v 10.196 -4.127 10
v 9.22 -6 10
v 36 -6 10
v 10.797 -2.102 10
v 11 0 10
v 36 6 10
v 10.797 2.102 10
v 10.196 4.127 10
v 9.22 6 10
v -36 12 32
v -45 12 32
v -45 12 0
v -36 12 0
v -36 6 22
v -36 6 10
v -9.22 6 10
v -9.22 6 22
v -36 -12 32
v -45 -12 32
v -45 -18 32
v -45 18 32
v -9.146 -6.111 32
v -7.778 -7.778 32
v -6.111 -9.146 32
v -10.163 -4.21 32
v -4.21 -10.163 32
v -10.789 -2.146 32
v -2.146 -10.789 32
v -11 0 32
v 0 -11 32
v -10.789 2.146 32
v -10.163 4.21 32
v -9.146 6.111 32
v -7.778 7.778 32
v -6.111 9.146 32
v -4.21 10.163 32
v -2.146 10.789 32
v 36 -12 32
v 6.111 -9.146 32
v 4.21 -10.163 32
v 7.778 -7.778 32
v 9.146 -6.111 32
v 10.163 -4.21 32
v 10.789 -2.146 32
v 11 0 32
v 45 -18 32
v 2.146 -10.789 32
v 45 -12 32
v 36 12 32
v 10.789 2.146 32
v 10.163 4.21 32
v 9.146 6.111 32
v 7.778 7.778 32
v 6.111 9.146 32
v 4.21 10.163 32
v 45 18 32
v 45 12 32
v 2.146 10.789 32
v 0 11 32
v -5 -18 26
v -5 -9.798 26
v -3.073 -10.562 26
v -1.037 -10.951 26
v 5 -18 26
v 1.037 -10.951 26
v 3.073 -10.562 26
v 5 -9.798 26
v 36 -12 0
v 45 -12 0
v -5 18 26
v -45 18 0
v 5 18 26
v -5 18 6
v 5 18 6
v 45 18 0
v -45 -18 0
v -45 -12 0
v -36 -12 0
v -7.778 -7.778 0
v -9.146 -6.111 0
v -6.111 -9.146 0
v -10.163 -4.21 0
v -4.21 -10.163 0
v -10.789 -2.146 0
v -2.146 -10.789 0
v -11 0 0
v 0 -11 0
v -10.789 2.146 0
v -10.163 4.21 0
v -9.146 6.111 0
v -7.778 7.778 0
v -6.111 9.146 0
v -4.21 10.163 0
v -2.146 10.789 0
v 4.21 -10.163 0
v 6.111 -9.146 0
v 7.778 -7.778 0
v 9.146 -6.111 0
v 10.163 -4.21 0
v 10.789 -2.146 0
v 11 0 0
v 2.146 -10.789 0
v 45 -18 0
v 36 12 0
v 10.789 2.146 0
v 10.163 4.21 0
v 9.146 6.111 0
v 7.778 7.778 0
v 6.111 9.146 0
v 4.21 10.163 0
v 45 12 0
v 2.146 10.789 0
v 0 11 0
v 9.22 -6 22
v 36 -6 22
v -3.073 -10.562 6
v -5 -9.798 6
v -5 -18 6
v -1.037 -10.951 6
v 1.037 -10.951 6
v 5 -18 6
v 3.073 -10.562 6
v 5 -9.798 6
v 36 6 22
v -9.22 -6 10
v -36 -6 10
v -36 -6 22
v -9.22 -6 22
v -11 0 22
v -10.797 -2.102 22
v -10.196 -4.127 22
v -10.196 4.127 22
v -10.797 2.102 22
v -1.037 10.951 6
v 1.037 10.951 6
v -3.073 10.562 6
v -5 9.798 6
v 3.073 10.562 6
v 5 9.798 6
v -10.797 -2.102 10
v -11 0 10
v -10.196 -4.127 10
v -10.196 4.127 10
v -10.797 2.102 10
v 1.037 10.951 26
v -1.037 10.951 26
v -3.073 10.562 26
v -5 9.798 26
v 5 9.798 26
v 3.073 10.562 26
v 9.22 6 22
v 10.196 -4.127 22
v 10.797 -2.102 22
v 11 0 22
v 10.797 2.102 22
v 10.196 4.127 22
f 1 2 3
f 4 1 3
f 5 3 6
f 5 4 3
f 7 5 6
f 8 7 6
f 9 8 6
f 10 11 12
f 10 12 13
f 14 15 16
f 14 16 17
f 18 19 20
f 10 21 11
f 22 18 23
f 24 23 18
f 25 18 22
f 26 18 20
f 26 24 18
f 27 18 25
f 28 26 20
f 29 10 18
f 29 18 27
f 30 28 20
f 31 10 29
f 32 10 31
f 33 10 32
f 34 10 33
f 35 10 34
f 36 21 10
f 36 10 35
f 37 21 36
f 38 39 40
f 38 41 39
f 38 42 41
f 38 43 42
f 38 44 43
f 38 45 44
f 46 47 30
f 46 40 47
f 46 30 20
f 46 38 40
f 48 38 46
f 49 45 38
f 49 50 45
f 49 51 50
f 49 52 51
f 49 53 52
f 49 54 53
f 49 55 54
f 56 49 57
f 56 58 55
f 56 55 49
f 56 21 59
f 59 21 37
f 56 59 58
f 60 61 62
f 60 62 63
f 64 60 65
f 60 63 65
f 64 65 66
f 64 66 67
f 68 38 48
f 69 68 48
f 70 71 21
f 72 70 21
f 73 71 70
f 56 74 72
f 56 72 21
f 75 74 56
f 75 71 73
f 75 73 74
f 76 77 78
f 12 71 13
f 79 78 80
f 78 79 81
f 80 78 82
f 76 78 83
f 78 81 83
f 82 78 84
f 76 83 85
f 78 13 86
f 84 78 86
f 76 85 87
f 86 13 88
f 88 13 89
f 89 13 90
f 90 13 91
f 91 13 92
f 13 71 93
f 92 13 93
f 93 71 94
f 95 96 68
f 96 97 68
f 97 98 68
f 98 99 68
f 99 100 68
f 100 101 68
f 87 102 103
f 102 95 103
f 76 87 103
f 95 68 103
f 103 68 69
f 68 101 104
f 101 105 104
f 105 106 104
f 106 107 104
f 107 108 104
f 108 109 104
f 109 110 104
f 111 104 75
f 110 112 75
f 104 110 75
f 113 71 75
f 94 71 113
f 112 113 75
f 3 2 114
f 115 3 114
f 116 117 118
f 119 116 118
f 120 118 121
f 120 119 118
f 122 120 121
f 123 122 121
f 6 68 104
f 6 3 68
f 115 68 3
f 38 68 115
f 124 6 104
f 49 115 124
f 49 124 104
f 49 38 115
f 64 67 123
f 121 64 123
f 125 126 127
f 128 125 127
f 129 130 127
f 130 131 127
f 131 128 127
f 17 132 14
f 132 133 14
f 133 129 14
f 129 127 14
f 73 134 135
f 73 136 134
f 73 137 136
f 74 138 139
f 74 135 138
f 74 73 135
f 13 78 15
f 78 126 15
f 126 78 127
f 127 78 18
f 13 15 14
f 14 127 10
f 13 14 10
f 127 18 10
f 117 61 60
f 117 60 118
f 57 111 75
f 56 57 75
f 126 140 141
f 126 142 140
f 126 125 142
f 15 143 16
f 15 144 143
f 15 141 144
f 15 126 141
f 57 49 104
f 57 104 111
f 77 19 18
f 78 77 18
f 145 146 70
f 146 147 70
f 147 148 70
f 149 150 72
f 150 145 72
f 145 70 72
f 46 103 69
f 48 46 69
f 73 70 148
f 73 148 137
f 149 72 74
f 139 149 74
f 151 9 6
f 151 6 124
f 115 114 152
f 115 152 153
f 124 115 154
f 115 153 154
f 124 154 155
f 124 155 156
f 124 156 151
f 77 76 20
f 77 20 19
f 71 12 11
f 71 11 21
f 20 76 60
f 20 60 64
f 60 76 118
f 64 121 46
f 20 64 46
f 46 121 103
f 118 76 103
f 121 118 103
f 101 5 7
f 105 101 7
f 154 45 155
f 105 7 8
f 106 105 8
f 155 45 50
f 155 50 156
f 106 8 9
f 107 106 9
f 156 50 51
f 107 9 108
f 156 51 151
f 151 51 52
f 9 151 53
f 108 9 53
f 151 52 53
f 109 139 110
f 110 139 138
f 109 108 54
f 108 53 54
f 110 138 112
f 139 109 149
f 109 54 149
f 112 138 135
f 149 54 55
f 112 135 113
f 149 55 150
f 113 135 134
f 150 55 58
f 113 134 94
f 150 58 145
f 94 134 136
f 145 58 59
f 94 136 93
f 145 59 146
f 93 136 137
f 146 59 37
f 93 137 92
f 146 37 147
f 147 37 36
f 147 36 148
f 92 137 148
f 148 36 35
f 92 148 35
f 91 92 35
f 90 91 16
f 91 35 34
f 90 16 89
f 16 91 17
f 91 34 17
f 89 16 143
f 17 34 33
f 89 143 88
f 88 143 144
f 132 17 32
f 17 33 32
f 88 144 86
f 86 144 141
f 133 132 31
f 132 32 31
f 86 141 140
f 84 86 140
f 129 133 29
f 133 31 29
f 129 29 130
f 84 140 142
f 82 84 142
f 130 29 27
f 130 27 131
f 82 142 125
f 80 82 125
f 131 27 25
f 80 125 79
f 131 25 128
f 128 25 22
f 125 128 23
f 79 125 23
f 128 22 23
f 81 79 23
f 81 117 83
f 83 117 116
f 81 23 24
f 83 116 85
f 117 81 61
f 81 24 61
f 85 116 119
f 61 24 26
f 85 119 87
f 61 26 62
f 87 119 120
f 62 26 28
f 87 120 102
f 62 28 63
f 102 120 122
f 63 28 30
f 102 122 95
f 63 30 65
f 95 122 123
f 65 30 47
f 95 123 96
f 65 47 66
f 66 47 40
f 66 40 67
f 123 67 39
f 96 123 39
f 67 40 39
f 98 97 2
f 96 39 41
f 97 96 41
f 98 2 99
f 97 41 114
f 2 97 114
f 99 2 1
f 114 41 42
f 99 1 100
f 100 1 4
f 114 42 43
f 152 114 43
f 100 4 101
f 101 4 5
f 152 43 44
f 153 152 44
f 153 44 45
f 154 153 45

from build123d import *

# Parameters (mm, degrees)
SKETCH_2_W          = 90
SKETCH_2_H          = 36
EXTRUDE_1_DEPTH     = 32
SKETCH_3_W          = 9
SKETCH_3_H          = 24
CUT_EXTRUDE_1_DEPTH = 59.077534383
SKETCH_4_W          = 9
SKETCH_4_H          = 24
CUT_EXTRUDE_2_DEPTH = 59.077534383
SKETCH_6_R          = 11
CUT_EXTRUDE_3_DEPTH = 59.077534383
SKETCH_7_W          = 10
SKETCH_7_H          = 20
CUT_EXTRUDE_4_DEPTH = 66.916613991
SKETCH_9_W          = 12
SKETCH_9_H          = 12
CUT_EXTRUDE_5_DEPTH = 89.932558717


with BuildPart() as part:
    # Эскиз2 → Бобышка-Вытянуть1 (new body)
    with BuildSketch(Plane.XY):
        Rectangle(SKETCH_2_W, SKETCH_2_H)
    extrude(amount=EXTRUDE_1_DEPTH)

    # Эскиз3 → Вырез-Вытянуть1 (cut, through all)
    with BuildSketch(Plane.XY.offset(32)):
        with Locations((-40.5, 0)):
            Rectangle(SKETCH_3_W, SKETCH_3_H)
    extrude(amount=-CUT_EXTRUDE_1_DEPTH, mode=Mode.SUBTRACT)

    # Эскиз4 → Вырез-Вытянуть2 (cut, through all)
    with BuildSketch(Plane.XY.offset(32)):
        with Locations((40.5, 0)):
            Rectangle(SKETCH_4_W, SKETCH_4_H)
    extrude(amount=-CUT_EXTRUDE_2_DEPTH, mode=Mode.SUBTRACT)

    # Эскиз6 → Вырез-Вытянуть3 (cut, through all)
    with BuildSketch(Plane.XY.offset(32)):
        Circle(SKETCH_6_R)
    extrude(amount=-CUT_EXTRUDE_3_DEPTH, mode=Mode.SUBTRACT)

    # Эскиз7 → Вырез-Вытянуть4 (cut, through all)
    with BuildSketch(Plane(origin=(0, 18, 0), x_dir=(1, 0, 0), z_dir=(0, 1, 0))):
        with Locations((0, -16)):
            Rectangle(SKETCH_7_W, SKETCH_7_H)
    extrude(amount=-CUT_EXTRUDE_4_DEPTH, mode=Mode.SUBTRACT)

    # Эскиз9 → Вырез-Вытянуть5 (cut, through all)
    with BuildSketch(Plane.ZY.offset(36)):
        with Locations((16, 0)):
            Rectangle(SKETCH_9_W, SKETCH_9_H)
    extrude(amount=-CUT_EXTRUDE_5_DEPTH, mode=Mode.SUBTRACT)


solid = part.part
